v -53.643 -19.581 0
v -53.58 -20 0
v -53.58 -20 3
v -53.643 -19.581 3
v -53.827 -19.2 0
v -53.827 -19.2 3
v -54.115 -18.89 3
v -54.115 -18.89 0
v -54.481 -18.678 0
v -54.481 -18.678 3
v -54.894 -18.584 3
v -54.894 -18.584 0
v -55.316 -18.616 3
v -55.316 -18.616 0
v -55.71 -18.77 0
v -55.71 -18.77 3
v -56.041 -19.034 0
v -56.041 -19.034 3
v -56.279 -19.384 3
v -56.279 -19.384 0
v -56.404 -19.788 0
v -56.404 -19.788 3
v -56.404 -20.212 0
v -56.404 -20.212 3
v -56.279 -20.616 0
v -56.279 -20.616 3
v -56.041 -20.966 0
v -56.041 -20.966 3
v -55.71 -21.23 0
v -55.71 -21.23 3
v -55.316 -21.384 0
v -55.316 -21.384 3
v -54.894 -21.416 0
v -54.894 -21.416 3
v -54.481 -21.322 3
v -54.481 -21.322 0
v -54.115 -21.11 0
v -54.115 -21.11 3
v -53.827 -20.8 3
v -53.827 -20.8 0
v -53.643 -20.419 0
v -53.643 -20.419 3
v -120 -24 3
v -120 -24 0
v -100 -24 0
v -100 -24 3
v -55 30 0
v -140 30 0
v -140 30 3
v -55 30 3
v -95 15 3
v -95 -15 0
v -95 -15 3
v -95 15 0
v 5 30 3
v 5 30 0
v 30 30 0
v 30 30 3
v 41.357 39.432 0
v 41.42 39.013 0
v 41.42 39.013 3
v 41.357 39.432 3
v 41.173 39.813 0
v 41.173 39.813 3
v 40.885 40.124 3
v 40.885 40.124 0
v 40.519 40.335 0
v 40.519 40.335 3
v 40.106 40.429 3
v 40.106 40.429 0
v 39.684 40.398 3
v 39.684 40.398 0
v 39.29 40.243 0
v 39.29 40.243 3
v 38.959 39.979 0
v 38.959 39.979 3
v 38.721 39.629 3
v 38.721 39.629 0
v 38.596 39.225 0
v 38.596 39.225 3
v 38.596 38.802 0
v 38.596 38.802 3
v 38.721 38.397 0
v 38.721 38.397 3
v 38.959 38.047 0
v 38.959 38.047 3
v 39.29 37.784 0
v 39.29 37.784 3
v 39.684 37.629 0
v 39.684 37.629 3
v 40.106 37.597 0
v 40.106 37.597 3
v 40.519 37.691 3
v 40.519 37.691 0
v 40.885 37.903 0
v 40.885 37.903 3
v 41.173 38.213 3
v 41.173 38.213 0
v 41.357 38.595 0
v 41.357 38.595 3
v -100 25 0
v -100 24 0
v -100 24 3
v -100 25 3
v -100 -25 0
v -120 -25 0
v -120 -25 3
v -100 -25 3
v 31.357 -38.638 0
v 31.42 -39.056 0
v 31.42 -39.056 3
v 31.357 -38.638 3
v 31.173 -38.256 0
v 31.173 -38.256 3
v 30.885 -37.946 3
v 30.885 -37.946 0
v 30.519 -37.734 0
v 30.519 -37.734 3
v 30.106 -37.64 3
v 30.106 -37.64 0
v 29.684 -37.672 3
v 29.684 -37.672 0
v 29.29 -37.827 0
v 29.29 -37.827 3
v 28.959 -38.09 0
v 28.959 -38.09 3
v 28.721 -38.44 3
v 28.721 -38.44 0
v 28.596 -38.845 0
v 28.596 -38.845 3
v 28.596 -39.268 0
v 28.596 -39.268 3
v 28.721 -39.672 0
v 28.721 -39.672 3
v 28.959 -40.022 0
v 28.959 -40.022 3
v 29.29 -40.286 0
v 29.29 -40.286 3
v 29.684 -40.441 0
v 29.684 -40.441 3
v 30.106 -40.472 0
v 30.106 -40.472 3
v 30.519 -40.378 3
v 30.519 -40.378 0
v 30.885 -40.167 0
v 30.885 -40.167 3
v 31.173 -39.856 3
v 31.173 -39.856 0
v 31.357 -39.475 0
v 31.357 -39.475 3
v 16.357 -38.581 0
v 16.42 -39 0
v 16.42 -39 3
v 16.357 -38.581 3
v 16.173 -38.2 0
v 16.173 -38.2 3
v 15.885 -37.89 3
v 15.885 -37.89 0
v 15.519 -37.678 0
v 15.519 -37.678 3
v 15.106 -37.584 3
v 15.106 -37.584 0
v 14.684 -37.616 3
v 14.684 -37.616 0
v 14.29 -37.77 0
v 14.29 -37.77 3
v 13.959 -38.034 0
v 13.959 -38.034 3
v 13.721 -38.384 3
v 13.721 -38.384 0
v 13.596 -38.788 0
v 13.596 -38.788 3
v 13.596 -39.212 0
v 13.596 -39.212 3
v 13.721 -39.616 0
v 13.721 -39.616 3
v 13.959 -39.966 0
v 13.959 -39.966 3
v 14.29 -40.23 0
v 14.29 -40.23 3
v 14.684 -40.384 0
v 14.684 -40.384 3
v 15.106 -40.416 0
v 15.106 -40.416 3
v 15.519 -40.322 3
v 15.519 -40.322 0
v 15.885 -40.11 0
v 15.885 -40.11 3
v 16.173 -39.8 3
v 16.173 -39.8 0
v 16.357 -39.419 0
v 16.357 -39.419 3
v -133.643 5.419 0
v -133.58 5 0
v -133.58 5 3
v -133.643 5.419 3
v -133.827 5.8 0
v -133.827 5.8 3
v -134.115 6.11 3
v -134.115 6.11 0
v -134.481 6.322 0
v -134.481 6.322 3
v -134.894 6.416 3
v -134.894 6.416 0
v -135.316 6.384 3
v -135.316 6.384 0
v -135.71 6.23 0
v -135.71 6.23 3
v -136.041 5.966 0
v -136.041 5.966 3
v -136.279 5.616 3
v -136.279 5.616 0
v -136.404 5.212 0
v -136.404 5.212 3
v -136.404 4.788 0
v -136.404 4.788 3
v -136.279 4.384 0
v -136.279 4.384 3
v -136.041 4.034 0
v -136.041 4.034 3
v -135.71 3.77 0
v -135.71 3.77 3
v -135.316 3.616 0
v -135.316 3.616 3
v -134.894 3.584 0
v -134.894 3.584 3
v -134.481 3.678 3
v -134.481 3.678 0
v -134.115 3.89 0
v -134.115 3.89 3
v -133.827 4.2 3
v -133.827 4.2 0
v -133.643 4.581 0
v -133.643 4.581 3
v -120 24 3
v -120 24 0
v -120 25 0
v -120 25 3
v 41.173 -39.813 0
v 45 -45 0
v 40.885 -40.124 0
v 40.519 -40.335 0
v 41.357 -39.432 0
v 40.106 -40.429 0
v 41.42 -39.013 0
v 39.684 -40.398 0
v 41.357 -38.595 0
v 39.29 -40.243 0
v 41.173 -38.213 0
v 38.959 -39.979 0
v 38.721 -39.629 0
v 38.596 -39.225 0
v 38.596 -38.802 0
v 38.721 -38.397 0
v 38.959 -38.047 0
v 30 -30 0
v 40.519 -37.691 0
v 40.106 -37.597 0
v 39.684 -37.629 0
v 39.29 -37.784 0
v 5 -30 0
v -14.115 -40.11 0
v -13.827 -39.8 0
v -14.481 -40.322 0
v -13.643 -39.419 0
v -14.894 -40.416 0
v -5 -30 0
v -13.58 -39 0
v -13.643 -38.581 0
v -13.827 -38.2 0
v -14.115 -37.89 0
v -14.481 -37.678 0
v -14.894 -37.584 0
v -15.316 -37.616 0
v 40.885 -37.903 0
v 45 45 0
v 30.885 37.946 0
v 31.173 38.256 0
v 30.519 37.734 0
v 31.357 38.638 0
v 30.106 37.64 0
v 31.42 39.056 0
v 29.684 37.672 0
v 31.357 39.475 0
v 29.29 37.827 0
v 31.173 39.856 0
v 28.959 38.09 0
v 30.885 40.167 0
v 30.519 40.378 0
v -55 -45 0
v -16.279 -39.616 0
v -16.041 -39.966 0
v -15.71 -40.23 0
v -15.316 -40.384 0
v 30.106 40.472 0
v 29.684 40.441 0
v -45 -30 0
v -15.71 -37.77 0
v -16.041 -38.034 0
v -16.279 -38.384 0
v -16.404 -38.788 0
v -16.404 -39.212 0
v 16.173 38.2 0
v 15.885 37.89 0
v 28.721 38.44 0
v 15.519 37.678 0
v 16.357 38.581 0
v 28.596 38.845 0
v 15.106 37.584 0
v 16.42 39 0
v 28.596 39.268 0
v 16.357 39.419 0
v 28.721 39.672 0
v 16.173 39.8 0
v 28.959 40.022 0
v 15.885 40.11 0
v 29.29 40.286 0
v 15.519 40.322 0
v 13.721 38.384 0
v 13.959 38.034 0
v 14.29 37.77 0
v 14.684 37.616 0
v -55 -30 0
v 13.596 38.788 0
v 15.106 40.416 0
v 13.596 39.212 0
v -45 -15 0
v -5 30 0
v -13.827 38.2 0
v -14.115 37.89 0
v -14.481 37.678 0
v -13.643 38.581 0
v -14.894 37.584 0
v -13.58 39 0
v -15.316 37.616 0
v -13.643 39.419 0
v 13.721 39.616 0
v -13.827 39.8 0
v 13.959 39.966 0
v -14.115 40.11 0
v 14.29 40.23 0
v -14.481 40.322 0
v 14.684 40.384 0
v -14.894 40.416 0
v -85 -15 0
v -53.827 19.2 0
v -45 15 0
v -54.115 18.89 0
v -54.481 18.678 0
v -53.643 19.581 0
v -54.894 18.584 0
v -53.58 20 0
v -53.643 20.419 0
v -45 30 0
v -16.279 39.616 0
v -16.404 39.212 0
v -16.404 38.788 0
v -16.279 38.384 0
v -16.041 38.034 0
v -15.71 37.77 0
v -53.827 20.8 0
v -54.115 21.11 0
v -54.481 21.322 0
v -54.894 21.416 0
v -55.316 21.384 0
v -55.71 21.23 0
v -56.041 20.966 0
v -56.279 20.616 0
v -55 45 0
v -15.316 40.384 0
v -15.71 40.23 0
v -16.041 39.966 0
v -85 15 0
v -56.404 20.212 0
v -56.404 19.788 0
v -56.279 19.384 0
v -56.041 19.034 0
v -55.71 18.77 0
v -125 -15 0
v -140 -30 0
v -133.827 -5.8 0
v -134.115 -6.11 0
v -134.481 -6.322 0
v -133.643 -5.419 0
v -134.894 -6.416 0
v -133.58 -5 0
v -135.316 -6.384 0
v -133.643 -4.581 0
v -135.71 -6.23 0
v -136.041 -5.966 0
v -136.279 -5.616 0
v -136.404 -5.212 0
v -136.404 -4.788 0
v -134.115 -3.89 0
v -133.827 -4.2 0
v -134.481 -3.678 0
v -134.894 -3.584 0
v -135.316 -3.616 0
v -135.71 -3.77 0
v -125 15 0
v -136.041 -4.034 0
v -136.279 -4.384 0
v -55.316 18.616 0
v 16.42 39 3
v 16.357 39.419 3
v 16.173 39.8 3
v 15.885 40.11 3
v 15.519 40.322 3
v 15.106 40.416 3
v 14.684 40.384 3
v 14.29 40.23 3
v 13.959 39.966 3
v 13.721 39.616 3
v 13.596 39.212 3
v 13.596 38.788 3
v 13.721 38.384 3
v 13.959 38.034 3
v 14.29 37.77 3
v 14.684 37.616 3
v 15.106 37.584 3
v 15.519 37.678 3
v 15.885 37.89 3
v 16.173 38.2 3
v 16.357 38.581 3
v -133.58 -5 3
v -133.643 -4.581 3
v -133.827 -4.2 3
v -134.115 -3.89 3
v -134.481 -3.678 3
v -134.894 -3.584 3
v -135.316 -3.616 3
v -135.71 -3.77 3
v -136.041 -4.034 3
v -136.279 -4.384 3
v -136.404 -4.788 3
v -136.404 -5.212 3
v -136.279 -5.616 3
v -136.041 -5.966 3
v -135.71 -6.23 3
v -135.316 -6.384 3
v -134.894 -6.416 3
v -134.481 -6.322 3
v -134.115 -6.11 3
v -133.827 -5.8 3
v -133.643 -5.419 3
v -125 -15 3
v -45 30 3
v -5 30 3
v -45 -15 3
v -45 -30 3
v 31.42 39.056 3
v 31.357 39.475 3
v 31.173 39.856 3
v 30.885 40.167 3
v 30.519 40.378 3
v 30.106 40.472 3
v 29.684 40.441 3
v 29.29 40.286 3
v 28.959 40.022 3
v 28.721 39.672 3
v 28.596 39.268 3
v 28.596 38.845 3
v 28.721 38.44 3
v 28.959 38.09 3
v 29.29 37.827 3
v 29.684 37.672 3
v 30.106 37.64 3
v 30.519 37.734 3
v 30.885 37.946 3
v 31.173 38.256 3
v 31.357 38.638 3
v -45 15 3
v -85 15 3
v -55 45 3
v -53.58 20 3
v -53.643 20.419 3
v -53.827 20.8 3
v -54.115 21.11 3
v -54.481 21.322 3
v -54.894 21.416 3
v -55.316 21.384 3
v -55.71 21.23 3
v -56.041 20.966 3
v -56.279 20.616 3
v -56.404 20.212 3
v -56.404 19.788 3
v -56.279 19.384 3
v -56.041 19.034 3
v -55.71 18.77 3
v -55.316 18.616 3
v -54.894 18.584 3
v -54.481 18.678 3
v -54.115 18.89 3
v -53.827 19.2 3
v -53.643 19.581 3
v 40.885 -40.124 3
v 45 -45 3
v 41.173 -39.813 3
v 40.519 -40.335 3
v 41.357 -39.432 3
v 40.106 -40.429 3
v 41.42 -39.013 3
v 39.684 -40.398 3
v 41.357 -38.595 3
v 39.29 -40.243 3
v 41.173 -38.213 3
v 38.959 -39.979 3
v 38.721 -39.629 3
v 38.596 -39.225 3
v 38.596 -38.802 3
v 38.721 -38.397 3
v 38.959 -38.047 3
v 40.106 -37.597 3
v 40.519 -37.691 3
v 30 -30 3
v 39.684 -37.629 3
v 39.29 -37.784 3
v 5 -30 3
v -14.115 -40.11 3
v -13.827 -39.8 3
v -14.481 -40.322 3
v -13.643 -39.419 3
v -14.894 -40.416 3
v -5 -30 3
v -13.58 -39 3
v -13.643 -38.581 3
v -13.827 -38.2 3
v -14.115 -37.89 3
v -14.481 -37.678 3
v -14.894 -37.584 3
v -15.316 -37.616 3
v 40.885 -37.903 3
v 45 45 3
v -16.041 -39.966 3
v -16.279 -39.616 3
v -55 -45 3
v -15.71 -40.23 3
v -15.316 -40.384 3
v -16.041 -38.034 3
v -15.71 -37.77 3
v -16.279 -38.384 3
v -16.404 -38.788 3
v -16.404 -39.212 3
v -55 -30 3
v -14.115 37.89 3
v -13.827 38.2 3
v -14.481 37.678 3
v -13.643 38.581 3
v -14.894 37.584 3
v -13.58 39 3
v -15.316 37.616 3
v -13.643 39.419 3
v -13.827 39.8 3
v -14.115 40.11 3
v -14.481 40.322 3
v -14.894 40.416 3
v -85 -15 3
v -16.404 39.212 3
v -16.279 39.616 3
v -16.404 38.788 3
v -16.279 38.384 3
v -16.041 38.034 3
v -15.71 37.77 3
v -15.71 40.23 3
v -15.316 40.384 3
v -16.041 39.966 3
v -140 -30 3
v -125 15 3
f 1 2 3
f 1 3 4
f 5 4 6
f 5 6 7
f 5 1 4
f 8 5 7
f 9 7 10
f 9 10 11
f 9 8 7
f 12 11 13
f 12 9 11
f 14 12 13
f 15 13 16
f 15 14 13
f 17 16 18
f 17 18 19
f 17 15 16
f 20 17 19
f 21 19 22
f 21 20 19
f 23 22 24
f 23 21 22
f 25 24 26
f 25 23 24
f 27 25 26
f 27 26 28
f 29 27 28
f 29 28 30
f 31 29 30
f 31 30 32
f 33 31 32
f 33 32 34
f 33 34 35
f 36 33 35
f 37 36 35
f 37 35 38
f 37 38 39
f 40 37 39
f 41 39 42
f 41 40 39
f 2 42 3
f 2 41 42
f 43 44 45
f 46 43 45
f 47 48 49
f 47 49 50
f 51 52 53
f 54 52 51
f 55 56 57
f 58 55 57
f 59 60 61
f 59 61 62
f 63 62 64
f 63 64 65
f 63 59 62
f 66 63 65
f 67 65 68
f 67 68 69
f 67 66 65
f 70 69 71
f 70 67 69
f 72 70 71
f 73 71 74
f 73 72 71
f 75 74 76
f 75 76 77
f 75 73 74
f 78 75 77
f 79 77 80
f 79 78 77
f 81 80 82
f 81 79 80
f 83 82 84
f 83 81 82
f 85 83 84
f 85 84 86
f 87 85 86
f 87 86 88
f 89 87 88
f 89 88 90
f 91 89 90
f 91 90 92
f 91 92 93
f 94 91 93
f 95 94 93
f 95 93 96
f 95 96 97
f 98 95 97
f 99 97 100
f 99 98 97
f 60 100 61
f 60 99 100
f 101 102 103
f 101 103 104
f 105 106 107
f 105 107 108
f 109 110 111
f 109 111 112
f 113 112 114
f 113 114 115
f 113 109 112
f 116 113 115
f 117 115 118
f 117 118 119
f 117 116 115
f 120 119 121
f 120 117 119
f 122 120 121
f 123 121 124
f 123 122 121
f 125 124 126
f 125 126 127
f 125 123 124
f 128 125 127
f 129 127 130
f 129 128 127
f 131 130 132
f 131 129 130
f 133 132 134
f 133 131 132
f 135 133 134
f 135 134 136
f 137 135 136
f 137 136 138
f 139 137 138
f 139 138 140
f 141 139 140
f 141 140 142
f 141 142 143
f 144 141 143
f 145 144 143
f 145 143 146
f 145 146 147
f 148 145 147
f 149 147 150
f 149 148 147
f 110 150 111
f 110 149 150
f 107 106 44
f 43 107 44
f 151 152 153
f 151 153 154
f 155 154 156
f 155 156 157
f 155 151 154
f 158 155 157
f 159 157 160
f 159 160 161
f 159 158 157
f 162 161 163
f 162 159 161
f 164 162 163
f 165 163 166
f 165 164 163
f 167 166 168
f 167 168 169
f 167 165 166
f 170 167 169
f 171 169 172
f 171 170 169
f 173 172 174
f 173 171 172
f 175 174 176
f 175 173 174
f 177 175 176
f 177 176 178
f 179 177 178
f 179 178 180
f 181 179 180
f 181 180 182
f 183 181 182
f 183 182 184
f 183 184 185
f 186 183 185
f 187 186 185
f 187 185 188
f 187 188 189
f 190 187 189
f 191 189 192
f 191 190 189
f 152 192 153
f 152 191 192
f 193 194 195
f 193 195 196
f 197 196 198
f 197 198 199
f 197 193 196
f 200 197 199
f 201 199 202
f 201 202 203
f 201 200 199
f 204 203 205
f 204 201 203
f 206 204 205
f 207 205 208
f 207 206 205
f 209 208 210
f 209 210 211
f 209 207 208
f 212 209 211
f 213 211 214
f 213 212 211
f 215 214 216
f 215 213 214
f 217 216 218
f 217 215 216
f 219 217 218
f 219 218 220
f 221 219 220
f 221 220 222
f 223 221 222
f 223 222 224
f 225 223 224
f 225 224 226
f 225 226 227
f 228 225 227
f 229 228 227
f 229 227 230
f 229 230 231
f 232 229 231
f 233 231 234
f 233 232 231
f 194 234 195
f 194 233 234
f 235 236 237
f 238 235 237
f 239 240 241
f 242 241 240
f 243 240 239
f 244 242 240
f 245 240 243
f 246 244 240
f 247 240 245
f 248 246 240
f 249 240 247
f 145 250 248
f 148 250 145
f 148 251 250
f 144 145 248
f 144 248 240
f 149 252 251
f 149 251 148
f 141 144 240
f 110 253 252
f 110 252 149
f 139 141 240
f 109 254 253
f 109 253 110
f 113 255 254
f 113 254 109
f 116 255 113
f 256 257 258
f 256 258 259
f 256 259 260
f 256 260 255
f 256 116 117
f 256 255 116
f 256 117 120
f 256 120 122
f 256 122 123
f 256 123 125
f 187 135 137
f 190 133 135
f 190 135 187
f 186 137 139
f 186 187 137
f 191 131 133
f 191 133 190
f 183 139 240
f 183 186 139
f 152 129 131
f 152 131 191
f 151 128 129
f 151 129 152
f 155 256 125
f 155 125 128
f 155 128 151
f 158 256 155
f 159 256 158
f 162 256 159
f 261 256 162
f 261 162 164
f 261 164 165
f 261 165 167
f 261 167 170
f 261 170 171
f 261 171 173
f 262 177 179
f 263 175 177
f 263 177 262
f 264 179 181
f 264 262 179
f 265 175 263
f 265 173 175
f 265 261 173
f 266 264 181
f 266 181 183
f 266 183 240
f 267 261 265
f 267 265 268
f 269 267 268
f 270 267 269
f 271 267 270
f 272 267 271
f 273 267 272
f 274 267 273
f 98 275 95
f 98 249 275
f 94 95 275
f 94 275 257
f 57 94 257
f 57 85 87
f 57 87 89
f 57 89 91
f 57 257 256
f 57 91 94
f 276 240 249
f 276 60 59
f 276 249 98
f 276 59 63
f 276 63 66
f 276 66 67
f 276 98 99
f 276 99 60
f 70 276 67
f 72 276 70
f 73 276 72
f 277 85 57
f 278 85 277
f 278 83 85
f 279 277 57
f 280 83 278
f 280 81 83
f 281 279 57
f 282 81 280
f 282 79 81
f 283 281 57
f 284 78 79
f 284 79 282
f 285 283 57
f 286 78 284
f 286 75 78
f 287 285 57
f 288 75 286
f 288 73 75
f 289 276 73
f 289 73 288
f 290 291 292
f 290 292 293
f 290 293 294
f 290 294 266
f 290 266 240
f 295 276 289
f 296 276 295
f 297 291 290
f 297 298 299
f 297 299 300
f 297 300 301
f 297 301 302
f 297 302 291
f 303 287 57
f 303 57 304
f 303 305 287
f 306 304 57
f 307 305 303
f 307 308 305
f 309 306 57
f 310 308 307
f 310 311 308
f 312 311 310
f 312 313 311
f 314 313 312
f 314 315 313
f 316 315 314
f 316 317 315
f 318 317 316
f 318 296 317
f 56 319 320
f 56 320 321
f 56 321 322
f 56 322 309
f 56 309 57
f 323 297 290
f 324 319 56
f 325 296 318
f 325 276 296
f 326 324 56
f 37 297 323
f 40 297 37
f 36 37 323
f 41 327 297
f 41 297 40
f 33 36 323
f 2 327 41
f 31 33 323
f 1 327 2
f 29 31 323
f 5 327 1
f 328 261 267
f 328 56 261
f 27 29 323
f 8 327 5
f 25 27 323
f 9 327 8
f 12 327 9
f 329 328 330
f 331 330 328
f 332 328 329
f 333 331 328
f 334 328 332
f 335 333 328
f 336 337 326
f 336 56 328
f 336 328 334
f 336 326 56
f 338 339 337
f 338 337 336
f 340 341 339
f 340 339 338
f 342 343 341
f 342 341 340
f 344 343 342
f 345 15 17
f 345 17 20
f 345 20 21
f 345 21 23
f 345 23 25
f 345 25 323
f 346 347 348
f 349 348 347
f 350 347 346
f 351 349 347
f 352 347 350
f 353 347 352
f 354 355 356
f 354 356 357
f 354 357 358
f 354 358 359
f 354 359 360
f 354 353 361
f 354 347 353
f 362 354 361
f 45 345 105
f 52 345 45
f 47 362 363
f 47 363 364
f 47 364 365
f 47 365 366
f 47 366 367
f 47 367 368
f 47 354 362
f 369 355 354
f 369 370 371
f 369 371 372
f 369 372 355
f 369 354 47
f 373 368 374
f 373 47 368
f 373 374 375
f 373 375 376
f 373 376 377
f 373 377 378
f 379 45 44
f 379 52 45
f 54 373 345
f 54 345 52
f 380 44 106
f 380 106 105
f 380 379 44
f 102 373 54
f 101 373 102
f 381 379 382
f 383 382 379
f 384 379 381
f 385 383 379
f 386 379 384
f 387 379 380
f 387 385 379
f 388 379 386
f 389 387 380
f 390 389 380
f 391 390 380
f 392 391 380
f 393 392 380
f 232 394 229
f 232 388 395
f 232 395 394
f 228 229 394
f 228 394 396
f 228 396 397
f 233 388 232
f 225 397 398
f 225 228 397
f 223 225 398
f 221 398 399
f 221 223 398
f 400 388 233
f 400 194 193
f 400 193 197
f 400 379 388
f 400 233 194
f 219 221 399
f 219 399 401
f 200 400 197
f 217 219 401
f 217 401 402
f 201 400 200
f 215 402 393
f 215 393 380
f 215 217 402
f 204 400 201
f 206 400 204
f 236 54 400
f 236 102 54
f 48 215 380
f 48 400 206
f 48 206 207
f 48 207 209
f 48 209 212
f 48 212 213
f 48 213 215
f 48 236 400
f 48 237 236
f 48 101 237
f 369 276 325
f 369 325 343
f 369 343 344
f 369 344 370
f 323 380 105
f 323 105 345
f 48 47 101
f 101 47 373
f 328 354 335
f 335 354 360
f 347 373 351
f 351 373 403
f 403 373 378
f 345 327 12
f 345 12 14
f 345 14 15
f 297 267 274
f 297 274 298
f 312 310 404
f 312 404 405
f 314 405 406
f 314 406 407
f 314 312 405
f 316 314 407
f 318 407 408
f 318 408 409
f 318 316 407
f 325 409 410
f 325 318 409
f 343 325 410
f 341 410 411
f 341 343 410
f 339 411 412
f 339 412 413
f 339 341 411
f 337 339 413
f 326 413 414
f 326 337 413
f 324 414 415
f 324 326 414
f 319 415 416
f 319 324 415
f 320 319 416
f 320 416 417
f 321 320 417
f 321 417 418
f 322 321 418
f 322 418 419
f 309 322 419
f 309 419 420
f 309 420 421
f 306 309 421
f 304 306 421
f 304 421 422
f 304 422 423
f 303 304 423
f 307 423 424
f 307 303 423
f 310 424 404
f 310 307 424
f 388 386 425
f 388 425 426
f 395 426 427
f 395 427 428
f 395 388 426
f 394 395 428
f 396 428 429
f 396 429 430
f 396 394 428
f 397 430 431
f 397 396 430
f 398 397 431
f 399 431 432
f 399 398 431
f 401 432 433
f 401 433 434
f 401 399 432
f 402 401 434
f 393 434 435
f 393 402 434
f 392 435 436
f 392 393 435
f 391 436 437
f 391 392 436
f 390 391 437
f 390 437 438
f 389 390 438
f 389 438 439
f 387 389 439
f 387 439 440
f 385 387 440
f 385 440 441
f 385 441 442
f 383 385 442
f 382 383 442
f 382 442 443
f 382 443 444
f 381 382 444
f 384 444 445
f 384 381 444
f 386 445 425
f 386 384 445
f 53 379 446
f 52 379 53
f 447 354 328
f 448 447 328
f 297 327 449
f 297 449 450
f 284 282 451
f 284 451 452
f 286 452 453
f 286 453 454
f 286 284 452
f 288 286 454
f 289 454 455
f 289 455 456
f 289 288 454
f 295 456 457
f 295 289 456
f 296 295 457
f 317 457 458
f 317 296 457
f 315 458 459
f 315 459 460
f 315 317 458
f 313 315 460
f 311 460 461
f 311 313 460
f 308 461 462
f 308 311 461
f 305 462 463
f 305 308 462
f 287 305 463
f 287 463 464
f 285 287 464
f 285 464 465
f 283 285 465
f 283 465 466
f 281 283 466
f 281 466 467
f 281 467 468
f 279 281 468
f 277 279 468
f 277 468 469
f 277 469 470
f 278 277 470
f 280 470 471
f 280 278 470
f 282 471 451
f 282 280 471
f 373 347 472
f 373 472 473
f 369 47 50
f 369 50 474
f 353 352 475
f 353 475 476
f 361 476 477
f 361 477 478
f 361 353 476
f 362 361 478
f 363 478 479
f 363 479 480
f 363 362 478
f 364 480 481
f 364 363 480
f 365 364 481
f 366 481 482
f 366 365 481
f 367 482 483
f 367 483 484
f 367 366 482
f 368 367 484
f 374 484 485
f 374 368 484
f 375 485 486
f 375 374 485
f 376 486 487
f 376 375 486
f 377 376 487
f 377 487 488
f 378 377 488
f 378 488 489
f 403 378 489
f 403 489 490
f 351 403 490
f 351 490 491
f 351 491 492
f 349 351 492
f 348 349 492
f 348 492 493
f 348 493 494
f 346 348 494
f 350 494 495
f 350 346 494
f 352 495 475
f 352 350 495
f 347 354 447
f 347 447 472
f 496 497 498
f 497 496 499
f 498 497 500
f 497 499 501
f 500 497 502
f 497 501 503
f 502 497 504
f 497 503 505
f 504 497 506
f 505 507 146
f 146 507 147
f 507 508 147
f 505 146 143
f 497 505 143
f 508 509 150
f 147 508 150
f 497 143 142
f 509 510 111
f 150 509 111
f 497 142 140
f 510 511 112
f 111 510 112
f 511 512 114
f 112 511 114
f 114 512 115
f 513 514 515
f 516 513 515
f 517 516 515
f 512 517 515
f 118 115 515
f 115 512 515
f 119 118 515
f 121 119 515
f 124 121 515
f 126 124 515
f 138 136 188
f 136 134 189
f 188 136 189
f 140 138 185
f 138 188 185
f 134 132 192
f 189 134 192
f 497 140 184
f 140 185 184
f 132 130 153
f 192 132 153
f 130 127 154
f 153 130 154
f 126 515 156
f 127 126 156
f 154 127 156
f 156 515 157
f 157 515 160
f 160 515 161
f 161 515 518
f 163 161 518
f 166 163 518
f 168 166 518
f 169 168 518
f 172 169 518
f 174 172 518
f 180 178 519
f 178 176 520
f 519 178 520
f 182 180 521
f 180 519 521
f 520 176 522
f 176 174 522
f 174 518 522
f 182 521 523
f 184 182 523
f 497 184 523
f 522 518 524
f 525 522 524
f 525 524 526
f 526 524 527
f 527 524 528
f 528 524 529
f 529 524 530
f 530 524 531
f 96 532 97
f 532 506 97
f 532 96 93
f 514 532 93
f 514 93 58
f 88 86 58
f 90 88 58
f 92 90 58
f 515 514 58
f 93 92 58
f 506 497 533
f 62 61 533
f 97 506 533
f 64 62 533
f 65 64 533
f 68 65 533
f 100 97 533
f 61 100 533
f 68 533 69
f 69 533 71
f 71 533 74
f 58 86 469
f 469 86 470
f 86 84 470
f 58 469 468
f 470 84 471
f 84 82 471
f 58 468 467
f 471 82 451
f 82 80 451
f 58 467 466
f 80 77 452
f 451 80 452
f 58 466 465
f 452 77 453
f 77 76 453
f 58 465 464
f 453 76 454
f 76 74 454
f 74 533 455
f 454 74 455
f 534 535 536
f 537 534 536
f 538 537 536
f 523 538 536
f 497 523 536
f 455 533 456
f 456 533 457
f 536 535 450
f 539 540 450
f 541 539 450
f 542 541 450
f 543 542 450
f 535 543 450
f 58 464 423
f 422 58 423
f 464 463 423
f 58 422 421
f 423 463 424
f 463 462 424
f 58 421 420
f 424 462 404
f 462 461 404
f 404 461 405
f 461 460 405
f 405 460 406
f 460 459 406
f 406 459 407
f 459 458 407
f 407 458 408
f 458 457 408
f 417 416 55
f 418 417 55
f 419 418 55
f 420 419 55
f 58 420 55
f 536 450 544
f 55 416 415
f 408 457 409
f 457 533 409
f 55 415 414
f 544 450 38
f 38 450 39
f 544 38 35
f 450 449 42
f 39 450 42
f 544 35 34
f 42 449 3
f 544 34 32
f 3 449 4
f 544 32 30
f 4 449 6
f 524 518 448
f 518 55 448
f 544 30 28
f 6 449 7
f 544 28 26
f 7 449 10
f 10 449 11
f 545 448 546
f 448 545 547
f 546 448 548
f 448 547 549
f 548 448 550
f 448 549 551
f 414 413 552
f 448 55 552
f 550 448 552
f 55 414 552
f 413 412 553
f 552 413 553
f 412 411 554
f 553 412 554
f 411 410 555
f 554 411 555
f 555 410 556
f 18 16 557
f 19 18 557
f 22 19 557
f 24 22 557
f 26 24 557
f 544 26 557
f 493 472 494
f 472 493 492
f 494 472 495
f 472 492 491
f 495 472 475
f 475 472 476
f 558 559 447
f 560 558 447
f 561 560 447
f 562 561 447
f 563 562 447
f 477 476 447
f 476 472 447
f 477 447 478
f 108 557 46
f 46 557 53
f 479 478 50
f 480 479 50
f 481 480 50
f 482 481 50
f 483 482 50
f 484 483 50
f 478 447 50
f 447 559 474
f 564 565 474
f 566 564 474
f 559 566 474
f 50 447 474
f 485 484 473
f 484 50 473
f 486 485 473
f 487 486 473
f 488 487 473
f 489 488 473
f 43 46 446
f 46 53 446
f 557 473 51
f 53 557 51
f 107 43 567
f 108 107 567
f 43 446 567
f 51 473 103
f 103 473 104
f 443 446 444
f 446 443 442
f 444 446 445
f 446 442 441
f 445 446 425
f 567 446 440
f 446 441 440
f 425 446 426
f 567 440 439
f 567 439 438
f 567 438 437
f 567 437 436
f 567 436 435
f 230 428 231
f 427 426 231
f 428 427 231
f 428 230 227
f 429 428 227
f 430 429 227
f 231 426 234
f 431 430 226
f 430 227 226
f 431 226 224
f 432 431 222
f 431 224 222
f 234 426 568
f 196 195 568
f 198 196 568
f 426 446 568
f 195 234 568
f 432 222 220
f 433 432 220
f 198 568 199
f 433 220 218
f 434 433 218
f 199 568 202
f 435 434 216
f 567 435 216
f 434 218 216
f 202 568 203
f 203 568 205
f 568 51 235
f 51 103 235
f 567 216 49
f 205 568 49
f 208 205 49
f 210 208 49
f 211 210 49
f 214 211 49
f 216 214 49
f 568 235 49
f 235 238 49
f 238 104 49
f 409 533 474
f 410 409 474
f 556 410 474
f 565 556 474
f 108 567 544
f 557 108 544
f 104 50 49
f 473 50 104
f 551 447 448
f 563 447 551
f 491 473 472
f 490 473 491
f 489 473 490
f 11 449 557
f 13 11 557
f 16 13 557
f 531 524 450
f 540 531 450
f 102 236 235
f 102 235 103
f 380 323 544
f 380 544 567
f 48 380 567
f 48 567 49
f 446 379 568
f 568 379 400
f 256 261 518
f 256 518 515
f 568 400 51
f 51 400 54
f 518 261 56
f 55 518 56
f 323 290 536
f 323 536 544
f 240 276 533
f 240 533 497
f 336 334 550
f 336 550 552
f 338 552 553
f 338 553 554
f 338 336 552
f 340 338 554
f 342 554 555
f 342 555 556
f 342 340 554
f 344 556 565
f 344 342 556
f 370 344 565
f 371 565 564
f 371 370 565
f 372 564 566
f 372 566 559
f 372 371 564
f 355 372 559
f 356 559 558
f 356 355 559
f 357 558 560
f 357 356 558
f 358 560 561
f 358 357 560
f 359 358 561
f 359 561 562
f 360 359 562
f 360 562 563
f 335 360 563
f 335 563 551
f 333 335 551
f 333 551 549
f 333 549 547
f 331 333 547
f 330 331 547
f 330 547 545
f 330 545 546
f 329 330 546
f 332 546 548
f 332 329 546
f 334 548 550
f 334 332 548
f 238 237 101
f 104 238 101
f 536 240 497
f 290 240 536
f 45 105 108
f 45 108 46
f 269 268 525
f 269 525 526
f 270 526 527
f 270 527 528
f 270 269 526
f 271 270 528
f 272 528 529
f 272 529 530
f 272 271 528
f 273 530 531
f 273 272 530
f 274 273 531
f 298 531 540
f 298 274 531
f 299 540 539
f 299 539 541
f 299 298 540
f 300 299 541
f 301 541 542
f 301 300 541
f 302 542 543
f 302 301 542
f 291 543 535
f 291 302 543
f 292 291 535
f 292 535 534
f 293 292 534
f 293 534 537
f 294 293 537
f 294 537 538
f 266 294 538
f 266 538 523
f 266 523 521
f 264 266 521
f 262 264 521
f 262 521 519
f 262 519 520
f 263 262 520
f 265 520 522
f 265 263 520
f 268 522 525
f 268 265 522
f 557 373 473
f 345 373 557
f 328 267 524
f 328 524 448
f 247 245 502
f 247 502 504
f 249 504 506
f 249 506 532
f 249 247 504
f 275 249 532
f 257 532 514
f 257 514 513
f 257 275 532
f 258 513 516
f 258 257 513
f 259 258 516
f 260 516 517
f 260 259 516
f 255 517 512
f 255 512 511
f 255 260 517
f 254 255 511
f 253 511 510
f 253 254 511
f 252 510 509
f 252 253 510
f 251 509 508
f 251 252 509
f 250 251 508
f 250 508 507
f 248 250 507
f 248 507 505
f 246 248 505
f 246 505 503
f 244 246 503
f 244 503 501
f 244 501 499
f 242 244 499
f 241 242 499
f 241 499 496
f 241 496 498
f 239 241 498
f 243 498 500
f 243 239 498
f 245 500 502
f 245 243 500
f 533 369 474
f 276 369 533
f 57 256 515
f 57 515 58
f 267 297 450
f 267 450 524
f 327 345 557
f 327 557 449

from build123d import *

# Parameters (mm, degrees)
SKETCH1_R           = 1.42
SKETCH1_W           = 25.000092503
SKETCH1_H           = 60
SKETCH1_W_2         = 30
SKETCH1_H_2         = 30
SKETCH1_W_3         = 20
SKETCH1_H_3         = 1
BOSS_EXTRUDE1_DEPTH = 3


with BuildPart() as part:
    # Sketch1 → Boss-Extrude1 (new body)
    with BuildSketch(Plane.XY):
        Polygon((-55, 45), (45, 45), (45, -45), (-55, -45), (-55, -30), (-140, -30), (-140, 30), (-55, 30), align=None)
        with Locations((15, 39)):
            Circle(SKETCH1_R, mode=Mode.SUBTRACT)
        with Locations((-15, 39)):
            Circle(SKETCH1_R, mode=Mode.SUBTRACT)
        with Locations((-15, -39)):
            Circle(SKETCH1_R, mode=Mode.SUBTRACT)
        with Locations((15, -39)):
            Circle(SKETCH1_R, mode=Mode.SUBTRACT)
        with Locations((30.000092503, 39.056338633)):
            Circle(SKETCH1_R, mode=Mode.SUBTRACT)
        with Locations((40, 39.013326424)):
            Circle(SKETCH1_R, mode=Mode.SUBTRACT)
        with Locations((-55, 20)):
            Circle(SKETCH1_R, mode=Mode.SUBTRACT)
        with Locations((-55, -20)):
            Circle(SKETCH1_R, mode=Mode.SUBTRACT)
        with Locations((40, -39.013326424)):
            Circle(SKETCH1_R, mode=Mode.SUBTRACT)
        with Locations((30.000092503, -39.056338633)):
            Circle(SKETCH1_R, mode=Mode.SUBTRACT)
        with Locations((-135, 5)):
            Circle(SKETCH1_R, mode=Mode.SUBTRACT)
        with Locations((-135, -5)):
            Circle(SKETCH1_R, mode=Mode.SUBTRACT)
        Polygon((-15, 30), (-45, 30), (-45, 15), (-85, 15), (-85, -15), (-45, -15), (-45, -30), (-5, -30), (-5, 30), align=None, mode=Mode.SUBTRACT)
        with Locations((17.500046252, 0)):
            Rectangle(SKETCH1_W, SKETCH1_H, mode=Mode.SUBTRACT)
        with Locations((-110, 0)):
            Rectangle(SKETCH1_W_2, SKETCH1_H_2, mode=Mode.SUBTRACT)
        with Locations((-110, -24.5)):
            Rectangle(SKETCH1_W_3, SKETCH1_H_3, mode=Mode.SUBTRACT)
        with Locations((-110, 24.5)):
            Rectangle(SKETCH1_W_3, SKETCH1_H_3, mode=Mode.SUBTRACT)
    extrude(amount=BOSS_EXTRUDE1_DEPTH)


solid = part.part
